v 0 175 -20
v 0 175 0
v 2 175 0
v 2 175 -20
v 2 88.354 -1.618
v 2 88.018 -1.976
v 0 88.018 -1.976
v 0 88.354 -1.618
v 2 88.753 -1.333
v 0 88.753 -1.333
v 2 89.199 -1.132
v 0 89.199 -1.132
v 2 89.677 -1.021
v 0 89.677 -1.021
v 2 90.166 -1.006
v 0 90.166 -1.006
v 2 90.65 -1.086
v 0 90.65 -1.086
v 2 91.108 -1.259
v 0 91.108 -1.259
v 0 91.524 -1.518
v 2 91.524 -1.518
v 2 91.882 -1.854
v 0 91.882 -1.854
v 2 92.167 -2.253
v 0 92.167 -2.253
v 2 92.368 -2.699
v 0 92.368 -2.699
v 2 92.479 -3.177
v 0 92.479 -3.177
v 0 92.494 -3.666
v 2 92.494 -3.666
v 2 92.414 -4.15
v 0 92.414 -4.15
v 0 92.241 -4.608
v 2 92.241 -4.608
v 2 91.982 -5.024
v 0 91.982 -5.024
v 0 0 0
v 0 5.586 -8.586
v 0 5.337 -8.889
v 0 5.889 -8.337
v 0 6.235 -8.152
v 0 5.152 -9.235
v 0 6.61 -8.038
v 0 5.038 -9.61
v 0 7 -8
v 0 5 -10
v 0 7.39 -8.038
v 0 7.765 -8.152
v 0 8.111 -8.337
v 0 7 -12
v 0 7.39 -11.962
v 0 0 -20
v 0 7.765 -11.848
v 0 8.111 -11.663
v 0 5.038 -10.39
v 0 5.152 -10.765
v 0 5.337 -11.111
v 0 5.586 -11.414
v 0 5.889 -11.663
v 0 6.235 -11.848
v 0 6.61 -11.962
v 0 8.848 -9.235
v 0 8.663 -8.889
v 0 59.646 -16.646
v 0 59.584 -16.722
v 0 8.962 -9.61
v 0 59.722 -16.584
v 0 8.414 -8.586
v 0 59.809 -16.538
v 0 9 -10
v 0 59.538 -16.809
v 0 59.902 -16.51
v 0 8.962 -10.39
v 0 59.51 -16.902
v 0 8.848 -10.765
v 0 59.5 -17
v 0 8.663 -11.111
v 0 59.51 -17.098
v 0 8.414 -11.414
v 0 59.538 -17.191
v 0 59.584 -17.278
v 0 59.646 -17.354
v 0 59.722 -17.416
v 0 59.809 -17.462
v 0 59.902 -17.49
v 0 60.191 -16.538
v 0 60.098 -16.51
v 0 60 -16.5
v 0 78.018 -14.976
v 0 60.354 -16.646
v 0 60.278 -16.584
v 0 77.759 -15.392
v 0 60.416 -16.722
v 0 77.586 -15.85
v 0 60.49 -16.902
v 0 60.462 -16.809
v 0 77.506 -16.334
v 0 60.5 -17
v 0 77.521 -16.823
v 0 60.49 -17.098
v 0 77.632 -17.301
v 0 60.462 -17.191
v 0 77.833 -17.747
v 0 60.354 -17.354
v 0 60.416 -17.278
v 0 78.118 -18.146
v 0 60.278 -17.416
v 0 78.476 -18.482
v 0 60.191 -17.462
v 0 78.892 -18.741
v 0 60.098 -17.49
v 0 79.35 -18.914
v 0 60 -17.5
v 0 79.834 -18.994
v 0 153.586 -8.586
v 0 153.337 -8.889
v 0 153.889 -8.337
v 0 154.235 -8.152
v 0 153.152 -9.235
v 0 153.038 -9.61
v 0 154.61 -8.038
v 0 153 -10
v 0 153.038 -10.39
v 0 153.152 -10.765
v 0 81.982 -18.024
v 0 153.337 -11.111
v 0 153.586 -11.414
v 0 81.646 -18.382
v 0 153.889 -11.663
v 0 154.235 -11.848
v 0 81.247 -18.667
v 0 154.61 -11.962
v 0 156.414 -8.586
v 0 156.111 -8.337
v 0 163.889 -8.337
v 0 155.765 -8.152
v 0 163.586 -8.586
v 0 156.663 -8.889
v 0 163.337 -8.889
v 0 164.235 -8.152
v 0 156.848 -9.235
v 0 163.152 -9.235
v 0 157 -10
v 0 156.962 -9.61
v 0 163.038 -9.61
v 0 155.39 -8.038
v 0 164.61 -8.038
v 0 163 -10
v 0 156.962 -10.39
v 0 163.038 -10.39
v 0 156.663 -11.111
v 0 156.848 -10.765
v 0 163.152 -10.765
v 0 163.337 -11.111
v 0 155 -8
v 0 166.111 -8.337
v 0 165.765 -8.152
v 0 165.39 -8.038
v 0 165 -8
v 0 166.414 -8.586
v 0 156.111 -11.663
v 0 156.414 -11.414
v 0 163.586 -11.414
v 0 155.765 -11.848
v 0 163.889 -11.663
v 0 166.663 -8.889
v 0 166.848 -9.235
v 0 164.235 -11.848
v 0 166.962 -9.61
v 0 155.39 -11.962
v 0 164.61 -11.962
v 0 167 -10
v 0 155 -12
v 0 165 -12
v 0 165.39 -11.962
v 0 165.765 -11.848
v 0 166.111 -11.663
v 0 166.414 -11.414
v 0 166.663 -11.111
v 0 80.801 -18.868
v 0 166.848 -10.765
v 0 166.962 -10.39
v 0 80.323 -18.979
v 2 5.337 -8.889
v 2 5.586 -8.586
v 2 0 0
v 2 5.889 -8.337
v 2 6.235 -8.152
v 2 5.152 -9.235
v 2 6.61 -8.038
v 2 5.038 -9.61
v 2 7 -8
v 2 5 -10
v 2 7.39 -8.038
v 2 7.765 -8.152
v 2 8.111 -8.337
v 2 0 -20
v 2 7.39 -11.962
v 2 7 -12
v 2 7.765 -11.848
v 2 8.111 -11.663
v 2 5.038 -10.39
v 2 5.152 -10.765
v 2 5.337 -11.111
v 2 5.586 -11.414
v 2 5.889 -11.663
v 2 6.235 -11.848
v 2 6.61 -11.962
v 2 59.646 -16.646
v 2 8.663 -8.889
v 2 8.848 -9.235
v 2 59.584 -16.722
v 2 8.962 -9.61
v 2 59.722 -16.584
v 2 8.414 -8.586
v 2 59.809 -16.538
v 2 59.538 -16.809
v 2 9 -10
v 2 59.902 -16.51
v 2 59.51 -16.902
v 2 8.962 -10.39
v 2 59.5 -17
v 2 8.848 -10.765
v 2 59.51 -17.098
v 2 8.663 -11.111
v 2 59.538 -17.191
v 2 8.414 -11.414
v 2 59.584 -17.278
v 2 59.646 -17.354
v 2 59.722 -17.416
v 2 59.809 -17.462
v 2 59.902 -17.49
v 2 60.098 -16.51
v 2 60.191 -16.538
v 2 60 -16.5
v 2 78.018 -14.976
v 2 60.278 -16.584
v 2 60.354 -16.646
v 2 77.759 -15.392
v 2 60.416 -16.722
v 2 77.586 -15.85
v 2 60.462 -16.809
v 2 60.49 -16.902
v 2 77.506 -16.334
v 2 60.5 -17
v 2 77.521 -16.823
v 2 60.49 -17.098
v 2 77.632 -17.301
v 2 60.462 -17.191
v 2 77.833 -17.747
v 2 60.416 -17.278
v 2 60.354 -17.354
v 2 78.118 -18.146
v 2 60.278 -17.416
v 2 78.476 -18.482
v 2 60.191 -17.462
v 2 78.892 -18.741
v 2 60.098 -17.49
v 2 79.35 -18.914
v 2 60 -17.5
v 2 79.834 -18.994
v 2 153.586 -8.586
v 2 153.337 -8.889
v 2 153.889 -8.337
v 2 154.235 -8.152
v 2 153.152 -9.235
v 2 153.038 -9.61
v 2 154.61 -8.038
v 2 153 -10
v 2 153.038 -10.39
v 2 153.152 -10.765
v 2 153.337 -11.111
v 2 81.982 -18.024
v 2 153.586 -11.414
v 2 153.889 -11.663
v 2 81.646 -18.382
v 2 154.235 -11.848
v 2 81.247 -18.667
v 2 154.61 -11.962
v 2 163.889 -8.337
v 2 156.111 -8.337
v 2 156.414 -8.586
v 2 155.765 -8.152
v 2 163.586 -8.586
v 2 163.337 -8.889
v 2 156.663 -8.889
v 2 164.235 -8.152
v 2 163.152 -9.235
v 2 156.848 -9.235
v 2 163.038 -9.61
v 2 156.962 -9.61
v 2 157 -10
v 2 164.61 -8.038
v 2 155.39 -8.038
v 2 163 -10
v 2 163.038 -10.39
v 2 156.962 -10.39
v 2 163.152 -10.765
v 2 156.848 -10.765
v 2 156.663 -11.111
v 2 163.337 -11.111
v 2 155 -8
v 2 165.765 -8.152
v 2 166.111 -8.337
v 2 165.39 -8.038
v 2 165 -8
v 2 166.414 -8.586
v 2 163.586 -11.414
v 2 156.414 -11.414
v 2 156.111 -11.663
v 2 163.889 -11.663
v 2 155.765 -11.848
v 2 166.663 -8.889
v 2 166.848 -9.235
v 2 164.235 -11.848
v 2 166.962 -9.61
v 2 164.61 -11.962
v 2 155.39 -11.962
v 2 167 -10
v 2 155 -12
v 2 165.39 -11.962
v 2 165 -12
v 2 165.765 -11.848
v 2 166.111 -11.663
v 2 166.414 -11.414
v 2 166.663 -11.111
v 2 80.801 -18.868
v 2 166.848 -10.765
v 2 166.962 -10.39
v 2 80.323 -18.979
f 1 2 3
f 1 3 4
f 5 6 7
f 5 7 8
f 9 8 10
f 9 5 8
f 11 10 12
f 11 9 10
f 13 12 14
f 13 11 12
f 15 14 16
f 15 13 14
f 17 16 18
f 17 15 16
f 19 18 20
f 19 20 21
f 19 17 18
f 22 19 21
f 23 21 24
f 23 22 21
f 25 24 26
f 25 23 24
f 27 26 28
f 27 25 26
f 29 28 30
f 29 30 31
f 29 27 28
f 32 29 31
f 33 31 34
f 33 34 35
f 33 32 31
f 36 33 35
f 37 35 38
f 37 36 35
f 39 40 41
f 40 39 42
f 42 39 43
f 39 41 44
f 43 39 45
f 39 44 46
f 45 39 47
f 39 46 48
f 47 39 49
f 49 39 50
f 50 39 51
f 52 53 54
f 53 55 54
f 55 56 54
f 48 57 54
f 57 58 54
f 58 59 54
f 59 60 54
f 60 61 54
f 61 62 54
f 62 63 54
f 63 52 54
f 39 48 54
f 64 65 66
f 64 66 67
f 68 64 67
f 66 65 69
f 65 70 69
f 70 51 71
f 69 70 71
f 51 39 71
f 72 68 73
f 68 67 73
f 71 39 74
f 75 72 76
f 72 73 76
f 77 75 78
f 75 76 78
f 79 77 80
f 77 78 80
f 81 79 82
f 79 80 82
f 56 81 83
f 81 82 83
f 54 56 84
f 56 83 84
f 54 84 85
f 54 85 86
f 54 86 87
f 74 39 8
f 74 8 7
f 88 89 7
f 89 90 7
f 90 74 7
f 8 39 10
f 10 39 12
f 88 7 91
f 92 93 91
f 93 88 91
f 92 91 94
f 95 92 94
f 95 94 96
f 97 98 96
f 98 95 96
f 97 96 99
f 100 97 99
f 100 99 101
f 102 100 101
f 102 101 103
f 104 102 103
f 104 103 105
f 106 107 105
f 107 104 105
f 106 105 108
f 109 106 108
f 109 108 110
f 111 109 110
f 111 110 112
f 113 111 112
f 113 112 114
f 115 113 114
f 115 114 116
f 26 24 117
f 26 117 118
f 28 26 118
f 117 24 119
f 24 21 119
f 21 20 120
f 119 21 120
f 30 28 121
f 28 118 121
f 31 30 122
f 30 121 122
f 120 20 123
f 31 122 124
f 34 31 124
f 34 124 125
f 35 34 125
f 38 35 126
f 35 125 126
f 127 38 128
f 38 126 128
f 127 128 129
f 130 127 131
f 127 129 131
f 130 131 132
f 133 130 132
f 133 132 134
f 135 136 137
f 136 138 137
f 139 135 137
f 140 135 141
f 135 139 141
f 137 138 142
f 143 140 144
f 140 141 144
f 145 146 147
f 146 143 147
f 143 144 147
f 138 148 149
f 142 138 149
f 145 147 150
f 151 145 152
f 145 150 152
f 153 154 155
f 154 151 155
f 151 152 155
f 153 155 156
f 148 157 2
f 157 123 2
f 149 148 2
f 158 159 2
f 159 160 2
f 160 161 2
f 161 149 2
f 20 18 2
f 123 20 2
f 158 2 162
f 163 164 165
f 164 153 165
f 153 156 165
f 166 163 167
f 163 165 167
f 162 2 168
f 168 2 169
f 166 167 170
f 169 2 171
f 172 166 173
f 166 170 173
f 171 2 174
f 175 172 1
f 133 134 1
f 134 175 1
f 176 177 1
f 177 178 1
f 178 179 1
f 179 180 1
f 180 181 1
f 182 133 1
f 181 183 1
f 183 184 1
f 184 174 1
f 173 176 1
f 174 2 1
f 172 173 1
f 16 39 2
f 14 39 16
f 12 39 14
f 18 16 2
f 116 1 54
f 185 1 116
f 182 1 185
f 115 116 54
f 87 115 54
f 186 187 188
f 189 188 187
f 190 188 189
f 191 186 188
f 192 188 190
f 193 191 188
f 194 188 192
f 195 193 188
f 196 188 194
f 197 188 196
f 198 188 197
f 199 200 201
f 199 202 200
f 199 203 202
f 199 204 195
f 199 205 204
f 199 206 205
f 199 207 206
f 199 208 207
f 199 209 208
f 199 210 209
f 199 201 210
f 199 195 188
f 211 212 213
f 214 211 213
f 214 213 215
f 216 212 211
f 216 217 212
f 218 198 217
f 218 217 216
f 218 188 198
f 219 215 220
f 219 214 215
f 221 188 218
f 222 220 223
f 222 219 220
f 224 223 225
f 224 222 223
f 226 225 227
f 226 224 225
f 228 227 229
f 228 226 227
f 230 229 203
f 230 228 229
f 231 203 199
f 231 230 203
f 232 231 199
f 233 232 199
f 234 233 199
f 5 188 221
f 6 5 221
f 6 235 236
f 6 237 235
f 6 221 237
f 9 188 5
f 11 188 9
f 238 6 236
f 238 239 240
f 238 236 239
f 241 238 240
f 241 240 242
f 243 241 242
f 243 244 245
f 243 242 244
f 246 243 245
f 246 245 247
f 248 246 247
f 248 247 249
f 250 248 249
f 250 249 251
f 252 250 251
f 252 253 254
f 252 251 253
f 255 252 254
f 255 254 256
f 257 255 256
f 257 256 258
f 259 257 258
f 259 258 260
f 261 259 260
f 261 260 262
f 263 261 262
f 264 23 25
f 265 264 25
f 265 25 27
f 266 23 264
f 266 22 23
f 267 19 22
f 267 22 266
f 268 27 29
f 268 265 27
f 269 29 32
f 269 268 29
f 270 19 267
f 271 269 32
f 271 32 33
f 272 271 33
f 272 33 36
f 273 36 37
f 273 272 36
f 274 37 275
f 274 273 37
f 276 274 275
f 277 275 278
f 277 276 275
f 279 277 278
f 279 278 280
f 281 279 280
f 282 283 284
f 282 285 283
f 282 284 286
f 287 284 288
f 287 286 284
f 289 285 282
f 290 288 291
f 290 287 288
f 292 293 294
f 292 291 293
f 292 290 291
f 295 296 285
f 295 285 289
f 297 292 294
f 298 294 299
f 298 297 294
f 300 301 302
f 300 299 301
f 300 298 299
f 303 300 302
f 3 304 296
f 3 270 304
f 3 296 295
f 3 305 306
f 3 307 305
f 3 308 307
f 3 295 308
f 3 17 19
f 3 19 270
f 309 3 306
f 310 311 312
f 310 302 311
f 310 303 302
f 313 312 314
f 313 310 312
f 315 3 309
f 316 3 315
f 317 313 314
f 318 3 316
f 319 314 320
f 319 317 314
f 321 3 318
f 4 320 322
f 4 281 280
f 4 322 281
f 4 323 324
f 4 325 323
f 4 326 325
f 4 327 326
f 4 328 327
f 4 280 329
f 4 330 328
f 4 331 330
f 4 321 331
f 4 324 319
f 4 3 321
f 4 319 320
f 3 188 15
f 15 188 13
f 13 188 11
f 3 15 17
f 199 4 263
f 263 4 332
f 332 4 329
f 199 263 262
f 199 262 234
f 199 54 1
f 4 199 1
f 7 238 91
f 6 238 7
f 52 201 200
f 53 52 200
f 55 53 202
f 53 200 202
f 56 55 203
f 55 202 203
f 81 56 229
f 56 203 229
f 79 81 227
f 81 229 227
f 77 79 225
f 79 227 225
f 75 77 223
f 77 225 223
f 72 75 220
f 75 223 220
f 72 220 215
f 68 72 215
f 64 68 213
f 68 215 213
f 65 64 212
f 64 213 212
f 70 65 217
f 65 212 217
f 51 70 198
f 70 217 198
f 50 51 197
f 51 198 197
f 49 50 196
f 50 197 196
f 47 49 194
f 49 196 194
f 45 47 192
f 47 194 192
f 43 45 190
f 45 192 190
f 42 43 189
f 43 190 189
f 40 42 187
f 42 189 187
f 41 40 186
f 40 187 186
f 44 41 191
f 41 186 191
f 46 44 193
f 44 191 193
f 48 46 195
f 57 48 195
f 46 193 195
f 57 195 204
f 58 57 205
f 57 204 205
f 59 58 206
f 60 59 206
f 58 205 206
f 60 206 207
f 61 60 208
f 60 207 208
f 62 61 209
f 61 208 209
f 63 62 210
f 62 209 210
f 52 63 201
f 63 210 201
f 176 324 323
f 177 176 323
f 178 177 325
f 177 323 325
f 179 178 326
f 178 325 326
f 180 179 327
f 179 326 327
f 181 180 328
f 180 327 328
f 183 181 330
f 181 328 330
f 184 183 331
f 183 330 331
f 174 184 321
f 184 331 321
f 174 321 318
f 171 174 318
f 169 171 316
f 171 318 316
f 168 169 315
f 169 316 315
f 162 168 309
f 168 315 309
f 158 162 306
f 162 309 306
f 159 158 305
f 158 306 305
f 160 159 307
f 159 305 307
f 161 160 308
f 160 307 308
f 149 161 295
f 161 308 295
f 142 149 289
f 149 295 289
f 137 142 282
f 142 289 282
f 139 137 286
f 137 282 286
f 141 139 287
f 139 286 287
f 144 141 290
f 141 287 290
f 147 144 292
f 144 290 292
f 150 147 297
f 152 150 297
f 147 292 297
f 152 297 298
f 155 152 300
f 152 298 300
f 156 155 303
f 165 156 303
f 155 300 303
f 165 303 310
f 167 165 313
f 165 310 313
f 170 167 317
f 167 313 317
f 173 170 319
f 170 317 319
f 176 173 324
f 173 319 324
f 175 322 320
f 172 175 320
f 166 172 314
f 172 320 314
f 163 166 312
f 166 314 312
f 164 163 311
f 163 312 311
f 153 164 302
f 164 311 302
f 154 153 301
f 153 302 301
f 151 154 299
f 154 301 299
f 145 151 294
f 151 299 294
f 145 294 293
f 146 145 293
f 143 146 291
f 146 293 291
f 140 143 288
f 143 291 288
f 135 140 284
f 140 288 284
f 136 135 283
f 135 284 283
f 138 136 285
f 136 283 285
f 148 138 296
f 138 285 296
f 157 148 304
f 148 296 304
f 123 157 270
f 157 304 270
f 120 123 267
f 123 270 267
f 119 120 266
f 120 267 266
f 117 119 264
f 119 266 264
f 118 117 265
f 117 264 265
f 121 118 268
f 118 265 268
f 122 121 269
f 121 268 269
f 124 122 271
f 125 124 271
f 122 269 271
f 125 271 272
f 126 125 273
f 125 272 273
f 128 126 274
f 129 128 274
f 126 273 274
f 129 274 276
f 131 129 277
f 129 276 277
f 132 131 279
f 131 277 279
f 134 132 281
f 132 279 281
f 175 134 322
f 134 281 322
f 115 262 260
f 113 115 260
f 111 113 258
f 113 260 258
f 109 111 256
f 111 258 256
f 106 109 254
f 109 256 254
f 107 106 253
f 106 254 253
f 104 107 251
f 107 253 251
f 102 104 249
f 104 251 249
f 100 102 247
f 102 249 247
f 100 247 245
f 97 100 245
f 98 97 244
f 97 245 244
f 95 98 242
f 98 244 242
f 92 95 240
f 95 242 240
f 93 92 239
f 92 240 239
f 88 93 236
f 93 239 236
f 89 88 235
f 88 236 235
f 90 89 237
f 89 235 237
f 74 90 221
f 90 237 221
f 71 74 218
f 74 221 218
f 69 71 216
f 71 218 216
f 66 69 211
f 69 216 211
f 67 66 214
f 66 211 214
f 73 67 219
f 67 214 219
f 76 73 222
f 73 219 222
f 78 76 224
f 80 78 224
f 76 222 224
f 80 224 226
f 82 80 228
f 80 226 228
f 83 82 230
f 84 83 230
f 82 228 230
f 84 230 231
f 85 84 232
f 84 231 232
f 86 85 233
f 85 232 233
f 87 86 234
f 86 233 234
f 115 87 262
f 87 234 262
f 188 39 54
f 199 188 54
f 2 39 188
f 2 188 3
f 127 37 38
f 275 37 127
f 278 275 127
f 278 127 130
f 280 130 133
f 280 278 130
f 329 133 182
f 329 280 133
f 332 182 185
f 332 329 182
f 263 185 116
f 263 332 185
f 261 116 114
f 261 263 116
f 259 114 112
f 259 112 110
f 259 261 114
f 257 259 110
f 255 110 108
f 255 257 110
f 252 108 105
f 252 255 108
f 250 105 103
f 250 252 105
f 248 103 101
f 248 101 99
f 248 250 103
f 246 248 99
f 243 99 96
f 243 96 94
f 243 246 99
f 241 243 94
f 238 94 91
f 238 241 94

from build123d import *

# Parameters (mm, degrees)
SKETCH1_W           = 20
SKETCH1_H           = 175
BOSS_EXTRUDE1_DEPTH = 2
SKETCH2_R           = 2
SKETCH2_R_2         = 0.5
CUT_EXTRUDE1_DEPTH  = 2


with BuildPart() as part:
    # Sketch1 → Boss-Extrude1 (new body)
    with BuildSketch(Plane(origin=(0, 0, 0), x_dir=(0, 0, -1), z_dir=(1, 0, 0))):
        with Locations((10, 87.5)):
            Rectangle(SKETCH1_W, SKETCH1_H)
    extrude(amount=BOSS_EXTRUDE1_DEPTH)

    # Sketch2 → Cut-Extrude1 (cut)
    with BuildSketch(Plane(origin=(2, 0, 0), x_dir=(0, 0, -1), z_dir=(1, 0, 0))):
        with Locations((10, 7)):
            Circle(SKETCH2_R)
        with Locations((10, 165)):
            Circle(SKETCH2_R)
        with Locations((10, 155)):
            Circle(SKETCH2_R)
        with Locations((17, 60)):
            Circle(SKETCH2_R_2)
        with BuildLine():
            Line((14.975723098, 78.018440027), (1.975723098, 88.018440027))
            ThreePointArc((1.975723098, 88.018440027), (1.518440027, 91.524276902), (5.024276902, 91.981559973))
            Line((5.024276902, 91.981559973), (18.024276902, 81.981559973))
            ThreePointArc((18.024276902, 81.981559973), (18.481559973, 78.475723098), (14.975723098, 78.018440027))
        make_face()
    extrude(amount=-CUT_EXTRUDE1_DEPTH, mode=Mode.SUBTRACT)


solid = part.part
